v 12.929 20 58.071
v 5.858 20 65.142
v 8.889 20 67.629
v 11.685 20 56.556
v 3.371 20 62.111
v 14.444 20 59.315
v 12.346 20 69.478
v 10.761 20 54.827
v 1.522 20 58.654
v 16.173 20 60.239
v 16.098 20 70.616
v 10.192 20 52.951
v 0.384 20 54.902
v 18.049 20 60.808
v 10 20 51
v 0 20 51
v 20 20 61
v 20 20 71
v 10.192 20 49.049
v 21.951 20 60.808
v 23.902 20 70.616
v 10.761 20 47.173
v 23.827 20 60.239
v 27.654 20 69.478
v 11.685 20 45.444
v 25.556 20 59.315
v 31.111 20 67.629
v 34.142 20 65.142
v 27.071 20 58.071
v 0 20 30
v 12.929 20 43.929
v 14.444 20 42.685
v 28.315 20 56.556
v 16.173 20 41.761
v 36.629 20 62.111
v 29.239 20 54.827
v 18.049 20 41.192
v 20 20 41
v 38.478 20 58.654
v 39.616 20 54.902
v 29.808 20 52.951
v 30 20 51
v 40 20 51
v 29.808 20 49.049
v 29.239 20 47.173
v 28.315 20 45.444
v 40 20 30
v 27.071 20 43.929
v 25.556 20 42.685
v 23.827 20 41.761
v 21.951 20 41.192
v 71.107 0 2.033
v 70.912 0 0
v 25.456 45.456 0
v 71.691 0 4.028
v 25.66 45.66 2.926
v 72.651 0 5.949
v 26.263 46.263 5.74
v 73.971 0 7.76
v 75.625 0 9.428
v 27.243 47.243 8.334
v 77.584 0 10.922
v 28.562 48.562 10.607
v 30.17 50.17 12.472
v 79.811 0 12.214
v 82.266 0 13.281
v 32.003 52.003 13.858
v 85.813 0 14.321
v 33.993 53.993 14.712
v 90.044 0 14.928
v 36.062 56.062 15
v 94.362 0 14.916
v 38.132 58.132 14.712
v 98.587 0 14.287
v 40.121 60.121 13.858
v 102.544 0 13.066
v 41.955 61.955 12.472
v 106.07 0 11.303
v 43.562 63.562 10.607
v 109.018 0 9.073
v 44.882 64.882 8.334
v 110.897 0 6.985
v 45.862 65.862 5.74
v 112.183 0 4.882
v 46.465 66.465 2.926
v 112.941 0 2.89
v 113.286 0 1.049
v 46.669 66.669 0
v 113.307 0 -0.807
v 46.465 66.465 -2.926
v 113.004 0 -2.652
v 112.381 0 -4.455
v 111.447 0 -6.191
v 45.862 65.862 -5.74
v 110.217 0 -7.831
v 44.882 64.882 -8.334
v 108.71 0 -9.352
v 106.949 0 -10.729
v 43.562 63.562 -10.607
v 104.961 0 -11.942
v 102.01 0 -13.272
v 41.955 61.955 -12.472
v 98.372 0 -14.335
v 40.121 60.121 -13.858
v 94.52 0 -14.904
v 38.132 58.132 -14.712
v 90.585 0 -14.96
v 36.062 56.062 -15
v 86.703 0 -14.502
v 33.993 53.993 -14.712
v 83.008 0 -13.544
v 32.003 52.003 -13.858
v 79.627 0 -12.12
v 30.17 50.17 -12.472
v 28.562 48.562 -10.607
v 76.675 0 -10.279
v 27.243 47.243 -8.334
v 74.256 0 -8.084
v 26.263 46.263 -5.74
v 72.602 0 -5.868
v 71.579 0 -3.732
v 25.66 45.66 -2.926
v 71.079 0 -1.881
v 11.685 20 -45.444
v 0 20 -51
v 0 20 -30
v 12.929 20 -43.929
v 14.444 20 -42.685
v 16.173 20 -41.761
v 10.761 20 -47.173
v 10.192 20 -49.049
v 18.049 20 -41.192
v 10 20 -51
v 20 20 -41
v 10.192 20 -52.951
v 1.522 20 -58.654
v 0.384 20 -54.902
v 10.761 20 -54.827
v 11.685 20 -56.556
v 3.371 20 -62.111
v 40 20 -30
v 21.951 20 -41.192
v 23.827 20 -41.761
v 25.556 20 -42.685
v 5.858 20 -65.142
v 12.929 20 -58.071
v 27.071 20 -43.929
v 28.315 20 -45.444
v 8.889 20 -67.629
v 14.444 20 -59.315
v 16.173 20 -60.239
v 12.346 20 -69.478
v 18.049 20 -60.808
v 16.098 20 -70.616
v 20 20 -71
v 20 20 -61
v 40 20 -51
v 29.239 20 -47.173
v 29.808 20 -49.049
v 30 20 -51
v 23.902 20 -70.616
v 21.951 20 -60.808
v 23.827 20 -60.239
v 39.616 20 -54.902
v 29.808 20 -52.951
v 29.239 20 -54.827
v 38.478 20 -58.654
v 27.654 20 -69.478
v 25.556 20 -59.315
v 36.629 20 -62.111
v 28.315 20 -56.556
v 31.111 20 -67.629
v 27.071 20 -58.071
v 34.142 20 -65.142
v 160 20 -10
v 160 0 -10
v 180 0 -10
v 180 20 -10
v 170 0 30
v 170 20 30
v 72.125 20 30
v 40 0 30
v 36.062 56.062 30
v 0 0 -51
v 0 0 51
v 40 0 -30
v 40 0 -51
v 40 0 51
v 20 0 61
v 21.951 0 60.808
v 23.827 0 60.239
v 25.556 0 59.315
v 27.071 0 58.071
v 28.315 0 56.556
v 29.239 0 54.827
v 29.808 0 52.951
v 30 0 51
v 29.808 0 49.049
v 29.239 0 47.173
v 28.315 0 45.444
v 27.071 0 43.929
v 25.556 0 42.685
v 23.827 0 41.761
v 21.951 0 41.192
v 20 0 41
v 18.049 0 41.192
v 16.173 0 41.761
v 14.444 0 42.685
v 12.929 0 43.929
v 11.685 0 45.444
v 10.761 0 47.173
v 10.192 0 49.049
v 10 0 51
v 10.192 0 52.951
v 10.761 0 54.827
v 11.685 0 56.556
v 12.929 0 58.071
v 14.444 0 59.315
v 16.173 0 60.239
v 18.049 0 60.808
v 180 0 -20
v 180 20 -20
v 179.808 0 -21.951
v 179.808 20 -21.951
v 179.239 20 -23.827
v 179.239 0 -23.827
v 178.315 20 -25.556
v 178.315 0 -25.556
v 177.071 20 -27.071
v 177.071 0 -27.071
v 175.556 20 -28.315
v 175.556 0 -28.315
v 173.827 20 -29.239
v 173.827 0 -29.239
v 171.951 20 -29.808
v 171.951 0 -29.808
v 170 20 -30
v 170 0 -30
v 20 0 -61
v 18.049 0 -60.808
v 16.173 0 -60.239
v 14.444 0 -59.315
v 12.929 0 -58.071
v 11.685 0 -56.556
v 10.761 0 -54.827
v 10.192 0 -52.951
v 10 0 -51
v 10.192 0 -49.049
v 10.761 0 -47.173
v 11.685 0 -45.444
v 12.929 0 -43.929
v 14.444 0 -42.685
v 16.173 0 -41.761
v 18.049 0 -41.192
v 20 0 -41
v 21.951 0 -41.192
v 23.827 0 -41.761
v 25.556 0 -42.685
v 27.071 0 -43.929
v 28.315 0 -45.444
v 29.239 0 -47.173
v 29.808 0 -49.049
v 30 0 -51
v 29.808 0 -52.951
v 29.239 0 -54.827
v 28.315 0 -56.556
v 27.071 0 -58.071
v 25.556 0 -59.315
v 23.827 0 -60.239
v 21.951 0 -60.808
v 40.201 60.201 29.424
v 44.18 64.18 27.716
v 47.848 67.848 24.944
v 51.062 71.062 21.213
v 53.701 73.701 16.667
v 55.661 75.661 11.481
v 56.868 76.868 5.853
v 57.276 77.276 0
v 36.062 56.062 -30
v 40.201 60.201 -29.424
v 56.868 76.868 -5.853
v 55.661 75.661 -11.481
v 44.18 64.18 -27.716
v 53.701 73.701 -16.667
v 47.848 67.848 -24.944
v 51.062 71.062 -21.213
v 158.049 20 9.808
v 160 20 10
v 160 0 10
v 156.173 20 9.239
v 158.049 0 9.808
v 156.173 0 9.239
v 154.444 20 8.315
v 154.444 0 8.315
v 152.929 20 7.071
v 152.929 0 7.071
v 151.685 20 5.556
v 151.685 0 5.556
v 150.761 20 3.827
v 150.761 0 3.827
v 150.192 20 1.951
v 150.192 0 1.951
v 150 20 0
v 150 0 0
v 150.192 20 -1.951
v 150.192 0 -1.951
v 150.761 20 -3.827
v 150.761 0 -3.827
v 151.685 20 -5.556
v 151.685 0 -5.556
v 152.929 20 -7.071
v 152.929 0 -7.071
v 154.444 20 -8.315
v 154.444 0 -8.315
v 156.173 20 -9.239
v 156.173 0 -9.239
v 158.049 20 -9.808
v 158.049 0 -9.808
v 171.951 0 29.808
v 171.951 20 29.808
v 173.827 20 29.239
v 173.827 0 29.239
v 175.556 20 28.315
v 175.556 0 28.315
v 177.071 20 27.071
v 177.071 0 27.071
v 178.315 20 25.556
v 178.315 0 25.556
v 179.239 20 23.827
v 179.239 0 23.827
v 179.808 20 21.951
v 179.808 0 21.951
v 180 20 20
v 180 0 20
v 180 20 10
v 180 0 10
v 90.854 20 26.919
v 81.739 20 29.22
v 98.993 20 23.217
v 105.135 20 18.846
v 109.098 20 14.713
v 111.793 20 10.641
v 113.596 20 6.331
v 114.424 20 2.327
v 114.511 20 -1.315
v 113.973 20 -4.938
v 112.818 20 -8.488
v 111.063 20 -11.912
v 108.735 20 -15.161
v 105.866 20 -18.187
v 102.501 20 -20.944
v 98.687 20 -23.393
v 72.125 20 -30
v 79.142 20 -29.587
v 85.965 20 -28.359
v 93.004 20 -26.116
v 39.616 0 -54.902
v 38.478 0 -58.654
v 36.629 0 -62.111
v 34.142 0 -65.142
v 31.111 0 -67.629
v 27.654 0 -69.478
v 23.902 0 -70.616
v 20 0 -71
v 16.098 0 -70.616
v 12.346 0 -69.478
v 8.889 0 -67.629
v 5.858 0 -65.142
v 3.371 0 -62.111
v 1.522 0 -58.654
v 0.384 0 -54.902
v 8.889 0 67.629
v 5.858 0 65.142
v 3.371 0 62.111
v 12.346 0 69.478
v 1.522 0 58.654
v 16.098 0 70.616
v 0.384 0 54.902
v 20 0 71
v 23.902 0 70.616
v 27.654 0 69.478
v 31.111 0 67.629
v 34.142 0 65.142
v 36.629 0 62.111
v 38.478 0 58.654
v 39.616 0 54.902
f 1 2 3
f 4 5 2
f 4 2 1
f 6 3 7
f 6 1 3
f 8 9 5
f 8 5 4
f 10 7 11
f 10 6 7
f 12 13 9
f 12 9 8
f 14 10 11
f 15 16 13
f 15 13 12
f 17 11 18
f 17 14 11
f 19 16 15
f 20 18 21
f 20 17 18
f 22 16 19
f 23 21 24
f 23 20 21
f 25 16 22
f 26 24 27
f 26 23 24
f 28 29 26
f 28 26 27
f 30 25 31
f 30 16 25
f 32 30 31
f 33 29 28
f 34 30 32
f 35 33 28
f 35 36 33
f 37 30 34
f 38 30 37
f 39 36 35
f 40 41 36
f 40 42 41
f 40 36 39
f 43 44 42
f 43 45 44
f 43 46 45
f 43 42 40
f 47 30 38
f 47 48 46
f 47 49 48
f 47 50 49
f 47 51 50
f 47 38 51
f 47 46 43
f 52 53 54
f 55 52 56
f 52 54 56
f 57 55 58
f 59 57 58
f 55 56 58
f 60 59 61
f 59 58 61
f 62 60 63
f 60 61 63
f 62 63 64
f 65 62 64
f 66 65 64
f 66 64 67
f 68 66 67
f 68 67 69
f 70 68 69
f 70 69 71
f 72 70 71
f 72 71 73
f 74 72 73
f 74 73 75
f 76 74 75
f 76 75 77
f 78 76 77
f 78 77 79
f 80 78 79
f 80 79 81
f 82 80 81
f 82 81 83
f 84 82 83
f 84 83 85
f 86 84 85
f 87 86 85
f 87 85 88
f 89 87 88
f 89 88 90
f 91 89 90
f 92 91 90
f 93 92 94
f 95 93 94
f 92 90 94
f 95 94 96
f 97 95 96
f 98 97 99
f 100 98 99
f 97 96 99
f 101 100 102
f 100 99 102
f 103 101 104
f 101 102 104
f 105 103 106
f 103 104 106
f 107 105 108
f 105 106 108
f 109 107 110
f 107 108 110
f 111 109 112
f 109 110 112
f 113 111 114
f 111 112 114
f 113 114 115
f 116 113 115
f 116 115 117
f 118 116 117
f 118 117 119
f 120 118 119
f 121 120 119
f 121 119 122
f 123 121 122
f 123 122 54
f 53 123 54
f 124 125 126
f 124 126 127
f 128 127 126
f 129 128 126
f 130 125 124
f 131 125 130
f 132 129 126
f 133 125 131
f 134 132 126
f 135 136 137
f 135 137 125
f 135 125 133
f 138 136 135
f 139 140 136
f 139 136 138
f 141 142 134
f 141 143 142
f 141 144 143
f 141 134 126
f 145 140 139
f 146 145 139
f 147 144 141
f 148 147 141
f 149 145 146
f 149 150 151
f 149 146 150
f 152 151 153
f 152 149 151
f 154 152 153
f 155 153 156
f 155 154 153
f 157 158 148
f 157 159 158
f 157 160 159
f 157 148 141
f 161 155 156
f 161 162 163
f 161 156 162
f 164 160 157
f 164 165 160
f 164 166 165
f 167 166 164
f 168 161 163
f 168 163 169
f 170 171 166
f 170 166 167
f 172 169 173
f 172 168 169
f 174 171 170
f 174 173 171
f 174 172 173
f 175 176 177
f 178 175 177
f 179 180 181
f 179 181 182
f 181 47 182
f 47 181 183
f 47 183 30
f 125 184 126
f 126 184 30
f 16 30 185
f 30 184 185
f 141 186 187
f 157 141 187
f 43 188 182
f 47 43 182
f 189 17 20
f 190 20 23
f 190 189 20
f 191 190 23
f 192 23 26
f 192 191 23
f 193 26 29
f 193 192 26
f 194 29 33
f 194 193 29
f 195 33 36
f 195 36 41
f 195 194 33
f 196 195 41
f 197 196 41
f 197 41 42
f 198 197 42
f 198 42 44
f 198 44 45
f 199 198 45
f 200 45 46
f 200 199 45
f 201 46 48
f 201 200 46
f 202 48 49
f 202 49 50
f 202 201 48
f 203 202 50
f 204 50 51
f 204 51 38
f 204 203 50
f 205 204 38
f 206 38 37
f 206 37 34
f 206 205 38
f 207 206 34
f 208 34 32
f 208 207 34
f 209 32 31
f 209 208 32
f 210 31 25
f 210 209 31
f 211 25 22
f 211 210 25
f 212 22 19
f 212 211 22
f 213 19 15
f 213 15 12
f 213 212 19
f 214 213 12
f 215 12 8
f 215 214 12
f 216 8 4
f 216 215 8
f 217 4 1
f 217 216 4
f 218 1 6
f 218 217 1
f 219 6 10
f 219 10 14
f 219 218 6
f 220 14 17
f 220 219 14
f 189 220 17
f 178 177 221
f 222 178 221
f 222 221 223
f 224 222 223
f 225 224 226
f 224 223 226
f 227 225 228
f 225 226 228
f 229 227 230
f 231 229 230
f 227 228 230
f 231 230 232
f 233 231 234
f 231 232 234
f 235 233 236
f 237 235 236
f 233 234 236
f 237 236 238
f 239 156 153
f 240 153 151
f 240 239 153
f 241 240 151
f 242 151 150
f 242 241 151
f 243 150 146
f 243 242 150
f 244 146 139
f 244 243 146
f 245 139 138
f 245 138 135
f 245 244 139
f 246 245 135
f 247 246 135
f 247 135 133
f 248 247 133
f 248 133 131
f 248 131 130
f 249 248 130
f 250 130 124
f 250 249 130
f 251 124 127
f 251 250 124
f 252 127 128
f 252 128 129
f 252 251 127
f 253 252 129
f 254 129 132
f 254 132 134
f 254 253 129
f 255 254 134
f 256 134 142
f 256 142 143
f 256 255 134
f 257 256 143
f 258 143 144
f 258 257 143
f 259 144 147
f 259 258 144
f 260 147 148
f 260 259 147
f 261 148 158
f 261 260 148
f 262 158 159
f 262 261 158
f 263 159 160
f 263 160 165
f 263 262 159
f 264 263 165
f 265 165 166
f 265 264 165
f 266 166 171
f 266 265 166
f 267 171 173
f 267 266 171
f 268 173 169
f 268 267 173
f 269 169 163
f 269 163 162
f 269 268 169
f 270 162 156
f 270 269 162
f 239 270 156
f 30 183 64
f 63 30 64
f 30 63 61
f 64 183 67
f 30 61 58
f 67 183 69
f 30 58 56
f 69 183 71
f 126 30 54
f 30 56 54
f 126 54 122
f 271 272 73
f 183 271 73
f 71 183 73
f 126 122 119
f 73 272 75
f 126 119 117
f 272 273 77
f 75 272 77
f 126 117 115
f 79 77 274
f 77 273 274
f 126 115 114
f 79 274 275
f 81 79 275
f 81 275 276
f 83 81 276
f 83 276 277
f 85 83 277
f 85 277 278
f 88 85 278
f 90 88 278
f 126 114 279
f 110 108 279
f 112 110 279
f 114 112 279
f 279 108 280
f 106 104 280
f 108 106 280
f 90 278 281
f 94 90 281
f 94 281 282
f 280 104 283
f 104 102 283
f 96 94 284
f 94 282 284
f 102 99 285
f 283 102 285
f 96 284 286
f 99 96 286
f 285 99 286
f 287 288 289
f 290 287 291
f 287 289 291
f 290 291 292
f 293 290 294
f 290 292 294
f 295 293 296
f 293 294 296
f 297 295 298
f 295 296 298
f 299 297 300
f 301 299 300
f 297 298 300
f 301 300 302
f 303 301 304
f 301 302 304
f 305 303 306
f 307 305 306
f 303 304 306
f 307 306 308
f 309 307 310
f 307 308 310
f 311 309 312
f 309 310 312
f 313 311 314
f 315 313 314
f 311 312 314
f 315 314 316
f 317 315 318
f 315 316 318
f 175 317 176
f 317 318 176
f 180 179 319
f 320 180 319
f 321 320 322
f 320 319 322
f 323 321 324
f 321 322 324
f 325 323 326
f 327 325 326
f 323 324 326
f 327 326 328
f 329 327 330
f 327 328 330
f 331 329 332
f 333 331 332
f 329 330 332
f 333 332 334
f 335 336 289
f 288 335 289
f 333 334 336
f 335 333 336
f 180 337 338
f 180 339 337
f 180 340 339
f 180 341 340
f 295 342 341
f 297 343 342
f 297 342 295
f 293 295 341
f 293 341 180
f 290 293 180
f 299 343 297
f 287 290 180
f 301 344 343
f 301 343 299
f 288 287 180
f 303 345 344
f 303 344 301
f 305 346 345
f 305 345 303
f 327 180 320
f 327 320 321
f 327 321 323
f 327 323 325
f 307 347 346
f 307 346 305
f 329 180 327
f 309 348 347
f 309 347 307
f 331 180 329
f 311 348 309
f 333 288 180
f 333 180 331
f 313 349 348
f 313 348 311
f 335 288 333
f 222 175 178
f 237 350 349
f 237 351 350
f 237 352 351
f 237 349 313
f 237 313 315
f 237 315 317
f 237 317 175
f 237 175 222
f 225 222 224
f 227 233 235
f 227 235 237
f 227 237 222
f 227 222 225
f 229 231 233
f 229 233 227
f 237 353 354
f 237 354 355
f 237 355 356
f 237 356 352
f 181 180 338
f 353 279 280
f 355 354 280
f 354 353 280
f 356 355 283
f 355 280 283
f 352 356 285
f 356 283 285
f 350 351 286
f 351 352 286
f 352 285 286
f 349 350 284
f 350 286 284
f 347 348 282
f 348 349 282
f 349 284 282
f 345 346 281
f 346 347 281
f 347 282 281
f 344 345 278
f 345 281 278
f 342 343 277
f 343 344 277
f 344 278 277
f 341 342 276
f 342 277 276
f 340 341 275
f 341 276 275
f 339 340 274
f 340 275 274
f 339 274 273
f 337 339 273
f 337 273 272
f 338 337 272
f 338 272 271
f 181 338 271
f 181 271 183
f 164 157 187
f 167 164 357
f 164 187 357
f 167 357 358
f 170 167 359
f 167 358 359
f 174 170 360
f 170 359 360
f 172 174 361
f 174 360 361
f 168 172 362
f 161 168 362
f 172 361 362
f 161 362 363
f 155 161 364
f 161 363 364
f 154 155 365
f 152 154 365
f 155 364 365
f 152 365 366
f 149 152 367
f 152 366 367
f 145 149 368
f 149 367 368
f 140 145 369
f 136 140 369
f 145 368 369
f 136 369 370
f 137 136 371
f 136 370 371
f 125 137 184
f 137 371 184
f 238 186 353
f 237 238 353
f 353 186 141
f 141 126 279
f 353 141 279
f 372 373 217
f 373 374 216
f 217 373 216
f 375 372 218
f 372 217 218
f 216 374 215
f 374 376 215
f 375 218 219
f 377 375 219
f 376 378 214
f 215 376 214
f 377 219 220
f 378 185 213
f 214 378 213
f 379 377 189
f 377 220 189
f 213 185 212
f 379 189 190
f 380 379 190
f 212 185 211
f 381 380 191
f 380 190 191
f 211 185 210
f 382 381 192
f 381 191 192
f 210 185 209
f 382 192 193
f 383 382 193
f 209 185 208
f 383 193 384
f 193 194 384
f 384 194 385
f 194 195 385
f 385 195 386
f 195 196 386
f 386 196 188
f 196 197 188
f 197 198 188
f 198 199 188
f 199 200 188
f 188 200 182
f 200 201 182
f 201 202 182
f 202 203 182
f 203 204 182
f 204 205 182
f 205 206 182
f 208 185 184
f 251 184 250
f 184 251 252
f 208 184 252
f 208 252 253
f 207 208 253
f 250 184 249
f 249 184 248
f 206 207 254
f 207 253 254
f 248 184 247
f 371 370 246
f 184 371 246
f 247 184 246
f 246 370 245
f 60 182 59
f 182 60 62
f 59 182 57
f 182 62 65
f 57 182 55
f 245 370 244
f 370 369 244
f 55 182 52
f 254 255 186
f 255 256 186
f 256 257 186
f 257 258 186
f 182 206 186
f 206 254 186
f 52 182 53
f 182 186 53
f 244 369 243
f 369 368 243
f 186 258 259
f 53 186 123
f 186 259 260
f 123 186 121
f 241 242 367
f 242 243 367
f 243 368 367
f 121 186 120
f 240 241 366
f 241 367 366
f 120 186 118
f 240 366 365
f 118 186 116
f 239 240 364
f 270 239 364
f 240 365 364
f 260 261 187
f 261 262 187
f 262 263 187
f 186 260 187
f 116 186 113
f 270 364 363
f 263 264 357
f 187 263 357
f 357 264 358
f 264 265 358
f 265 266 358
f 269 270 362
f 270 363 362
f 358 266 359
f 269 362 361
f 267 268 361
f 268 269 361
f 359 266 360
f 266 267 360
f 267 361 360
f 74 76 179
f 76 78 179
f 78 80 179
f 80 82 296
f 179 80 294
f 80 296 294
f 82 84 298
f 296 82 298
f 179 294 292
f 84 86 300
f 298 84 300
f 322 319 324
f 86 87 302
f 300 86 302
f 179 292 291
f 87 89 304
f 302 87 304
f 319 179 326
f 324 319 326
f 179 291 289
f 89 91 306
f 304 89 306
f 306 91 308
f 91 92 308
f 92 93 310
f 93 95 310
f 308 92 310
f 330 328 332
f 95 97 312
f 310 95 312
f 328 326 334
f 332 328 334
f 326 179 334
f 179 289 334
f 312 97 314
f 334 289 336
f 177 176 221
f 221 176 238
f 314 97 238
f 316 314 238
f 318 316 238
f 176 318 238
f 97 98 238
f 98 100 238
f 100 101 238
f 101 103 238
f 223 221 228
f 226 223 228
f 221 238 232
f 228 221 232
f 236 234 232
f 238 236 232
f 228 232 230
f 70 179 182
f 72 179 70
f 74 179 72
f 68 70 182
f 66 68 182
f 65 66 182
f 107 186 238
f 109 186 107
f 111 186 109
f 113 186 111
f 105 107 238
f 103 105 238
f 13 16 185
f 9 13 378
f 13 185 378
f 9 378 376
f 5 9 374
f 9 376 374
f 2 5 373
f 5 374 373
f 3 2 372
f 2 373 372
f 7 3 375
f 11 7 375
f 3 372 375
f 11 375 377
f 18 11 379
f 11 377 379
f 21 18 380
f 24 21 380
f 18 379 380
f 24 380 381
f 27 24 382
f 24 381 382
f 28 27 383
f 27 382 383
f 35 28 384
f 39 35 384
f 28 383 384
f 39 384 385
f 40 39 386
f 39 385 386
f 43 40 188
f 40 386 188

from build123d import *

# Parameters (mm, degrees)
SKETCH1_R           = 10
BOSS_EXTRUDE1_DEPTH = 20
BOSS_EXTRUDE2_REACH = 205.079
CUT_EXTRUDE1_REACH  = 215.698
SKETCH3_R           = 15


with BuildPart() as part:
    # Sketch1 → Boss-Extrude1 (new body)
    with BuildSketch(Plane(origin=(0, 0, 0), x_dir=(1, 0, 0), z_dir=(0, 1, 0))):
        with BuildLine():
            Line((0, 51), (0, -51))
            ThreePointArc((0, -51), (20, -71), (40, -51))
            Line((40, -51), (40, -30))
            Line((40, -30), (170, -30))
            ThreePointArc((170, -30), (177.071067812, -27.071067812), (180, -20))
            Line((180, -20), (180, -10))
            Line((180, -10), (160, -10))
            ThreePointArc((160, -10), (150, 0), (160, 10))
            Line((160, 10), (180, 10))
            Line((180, 10), (180, 20))
            ThreePointArc((180, 20), (177.071067812, 27.071067812), (170, 30))
            Line((170, 30), (40, 30))
            Line((40, 30), (40, 51))
            ThreePointArc((40, 51), (20, 71), (0, 51))
        make_face()
        with Locations(Location((20, -51, 0), (0, 0, 270))):
            Circle(SKETCH1_R, mode=Mode.SUBTRACT)
        with Locations(Location((20, 51, 0), (0, 0, 90))):
            Circle(SKETCH1_R, mode=Mode.SUBTRACT)
    extrude(amount=BOSS_EXTRUDE1_DEPTH)

    # Boss-Extrude2: up to this face of the body (flat: up to its plane)
    boss_extrude2_end = Plane(part.part.faces().sort_by_distance((73.396795742, 20, 0))[0])
    # Sketch2 → Boss-Extrude2 (add, up to the picked face)
    with BuildSketch(Plane(origin=(-10, 10, 0), x_dir=(0, 0, 1), z_dir=(-0.7071067811865512, 0.7071067811865438, 0)), mode=Mode.PRIVATE) as boss_extrude2_sk1:
        with BuildLine():
            Line((30, 14.142135624), (-30, 14.142135624))
            Line((-30, 14.142135624), (-30, 65.142135624))
            ThreePointArc((-30, 65.142135624), (0, 95.142135624), (30, 65.142135624))
            Line((30, 65.142135624), (30, 14.142135624))
        make_face()
    boss_extrude2_tool1 = split(extrude(boss_extrude2_sk1.sketch, amount=-BOSS_EXTRUDE2_REACH, mode=Mode.PRIVATE), bisect_by=boss_extrude2_end, keep=Keep.BOTH, mode=Mode.PRIVATE)
    add(boss_extrude2_tool1.solids().sort_by(Axis((26.574223, 46.574223, 0), (0.7071067811865512, -0.7071067811865438, 0)))[0])

    # Cut-Extrude1: up to this plane
    cut_extrude1_end = Plane(origin=(20, 0, 51), z_dir=(0, 1, 0))
    # Sketch3 → Cut-Extrude1 (cut, up to the surface)
    with BuildSketch(Plane(origin=(-10, 10, 0), x_dir=(0, 0, 1), z_dir=(-0.7071067811865513, 0.7071067811865438, 0)), mode=Mode.PRIVATE) as cut_extrude1_sk1:
        with Locations(Location((0, 65.142135624, 0), (0, 0, 270))):
            Circle(SKETCH3_R)
    cut_extrude1_tool1 = split(extrude(cut_extrude1_sk1.sketch, amount=-CUT_EXTRUDE1_REACH, mode=Mode.PRIVATE), bisect_by=cut_extrude1_end, keep=Keep.BOTH, mode=Mode.PRIVATE)
    add(cut_extrude1_tool1.solids().sort_by_distance((36.062446, 56.062446, 0))[0], mode=Mode.SUBTRACT)


solid = part.part
